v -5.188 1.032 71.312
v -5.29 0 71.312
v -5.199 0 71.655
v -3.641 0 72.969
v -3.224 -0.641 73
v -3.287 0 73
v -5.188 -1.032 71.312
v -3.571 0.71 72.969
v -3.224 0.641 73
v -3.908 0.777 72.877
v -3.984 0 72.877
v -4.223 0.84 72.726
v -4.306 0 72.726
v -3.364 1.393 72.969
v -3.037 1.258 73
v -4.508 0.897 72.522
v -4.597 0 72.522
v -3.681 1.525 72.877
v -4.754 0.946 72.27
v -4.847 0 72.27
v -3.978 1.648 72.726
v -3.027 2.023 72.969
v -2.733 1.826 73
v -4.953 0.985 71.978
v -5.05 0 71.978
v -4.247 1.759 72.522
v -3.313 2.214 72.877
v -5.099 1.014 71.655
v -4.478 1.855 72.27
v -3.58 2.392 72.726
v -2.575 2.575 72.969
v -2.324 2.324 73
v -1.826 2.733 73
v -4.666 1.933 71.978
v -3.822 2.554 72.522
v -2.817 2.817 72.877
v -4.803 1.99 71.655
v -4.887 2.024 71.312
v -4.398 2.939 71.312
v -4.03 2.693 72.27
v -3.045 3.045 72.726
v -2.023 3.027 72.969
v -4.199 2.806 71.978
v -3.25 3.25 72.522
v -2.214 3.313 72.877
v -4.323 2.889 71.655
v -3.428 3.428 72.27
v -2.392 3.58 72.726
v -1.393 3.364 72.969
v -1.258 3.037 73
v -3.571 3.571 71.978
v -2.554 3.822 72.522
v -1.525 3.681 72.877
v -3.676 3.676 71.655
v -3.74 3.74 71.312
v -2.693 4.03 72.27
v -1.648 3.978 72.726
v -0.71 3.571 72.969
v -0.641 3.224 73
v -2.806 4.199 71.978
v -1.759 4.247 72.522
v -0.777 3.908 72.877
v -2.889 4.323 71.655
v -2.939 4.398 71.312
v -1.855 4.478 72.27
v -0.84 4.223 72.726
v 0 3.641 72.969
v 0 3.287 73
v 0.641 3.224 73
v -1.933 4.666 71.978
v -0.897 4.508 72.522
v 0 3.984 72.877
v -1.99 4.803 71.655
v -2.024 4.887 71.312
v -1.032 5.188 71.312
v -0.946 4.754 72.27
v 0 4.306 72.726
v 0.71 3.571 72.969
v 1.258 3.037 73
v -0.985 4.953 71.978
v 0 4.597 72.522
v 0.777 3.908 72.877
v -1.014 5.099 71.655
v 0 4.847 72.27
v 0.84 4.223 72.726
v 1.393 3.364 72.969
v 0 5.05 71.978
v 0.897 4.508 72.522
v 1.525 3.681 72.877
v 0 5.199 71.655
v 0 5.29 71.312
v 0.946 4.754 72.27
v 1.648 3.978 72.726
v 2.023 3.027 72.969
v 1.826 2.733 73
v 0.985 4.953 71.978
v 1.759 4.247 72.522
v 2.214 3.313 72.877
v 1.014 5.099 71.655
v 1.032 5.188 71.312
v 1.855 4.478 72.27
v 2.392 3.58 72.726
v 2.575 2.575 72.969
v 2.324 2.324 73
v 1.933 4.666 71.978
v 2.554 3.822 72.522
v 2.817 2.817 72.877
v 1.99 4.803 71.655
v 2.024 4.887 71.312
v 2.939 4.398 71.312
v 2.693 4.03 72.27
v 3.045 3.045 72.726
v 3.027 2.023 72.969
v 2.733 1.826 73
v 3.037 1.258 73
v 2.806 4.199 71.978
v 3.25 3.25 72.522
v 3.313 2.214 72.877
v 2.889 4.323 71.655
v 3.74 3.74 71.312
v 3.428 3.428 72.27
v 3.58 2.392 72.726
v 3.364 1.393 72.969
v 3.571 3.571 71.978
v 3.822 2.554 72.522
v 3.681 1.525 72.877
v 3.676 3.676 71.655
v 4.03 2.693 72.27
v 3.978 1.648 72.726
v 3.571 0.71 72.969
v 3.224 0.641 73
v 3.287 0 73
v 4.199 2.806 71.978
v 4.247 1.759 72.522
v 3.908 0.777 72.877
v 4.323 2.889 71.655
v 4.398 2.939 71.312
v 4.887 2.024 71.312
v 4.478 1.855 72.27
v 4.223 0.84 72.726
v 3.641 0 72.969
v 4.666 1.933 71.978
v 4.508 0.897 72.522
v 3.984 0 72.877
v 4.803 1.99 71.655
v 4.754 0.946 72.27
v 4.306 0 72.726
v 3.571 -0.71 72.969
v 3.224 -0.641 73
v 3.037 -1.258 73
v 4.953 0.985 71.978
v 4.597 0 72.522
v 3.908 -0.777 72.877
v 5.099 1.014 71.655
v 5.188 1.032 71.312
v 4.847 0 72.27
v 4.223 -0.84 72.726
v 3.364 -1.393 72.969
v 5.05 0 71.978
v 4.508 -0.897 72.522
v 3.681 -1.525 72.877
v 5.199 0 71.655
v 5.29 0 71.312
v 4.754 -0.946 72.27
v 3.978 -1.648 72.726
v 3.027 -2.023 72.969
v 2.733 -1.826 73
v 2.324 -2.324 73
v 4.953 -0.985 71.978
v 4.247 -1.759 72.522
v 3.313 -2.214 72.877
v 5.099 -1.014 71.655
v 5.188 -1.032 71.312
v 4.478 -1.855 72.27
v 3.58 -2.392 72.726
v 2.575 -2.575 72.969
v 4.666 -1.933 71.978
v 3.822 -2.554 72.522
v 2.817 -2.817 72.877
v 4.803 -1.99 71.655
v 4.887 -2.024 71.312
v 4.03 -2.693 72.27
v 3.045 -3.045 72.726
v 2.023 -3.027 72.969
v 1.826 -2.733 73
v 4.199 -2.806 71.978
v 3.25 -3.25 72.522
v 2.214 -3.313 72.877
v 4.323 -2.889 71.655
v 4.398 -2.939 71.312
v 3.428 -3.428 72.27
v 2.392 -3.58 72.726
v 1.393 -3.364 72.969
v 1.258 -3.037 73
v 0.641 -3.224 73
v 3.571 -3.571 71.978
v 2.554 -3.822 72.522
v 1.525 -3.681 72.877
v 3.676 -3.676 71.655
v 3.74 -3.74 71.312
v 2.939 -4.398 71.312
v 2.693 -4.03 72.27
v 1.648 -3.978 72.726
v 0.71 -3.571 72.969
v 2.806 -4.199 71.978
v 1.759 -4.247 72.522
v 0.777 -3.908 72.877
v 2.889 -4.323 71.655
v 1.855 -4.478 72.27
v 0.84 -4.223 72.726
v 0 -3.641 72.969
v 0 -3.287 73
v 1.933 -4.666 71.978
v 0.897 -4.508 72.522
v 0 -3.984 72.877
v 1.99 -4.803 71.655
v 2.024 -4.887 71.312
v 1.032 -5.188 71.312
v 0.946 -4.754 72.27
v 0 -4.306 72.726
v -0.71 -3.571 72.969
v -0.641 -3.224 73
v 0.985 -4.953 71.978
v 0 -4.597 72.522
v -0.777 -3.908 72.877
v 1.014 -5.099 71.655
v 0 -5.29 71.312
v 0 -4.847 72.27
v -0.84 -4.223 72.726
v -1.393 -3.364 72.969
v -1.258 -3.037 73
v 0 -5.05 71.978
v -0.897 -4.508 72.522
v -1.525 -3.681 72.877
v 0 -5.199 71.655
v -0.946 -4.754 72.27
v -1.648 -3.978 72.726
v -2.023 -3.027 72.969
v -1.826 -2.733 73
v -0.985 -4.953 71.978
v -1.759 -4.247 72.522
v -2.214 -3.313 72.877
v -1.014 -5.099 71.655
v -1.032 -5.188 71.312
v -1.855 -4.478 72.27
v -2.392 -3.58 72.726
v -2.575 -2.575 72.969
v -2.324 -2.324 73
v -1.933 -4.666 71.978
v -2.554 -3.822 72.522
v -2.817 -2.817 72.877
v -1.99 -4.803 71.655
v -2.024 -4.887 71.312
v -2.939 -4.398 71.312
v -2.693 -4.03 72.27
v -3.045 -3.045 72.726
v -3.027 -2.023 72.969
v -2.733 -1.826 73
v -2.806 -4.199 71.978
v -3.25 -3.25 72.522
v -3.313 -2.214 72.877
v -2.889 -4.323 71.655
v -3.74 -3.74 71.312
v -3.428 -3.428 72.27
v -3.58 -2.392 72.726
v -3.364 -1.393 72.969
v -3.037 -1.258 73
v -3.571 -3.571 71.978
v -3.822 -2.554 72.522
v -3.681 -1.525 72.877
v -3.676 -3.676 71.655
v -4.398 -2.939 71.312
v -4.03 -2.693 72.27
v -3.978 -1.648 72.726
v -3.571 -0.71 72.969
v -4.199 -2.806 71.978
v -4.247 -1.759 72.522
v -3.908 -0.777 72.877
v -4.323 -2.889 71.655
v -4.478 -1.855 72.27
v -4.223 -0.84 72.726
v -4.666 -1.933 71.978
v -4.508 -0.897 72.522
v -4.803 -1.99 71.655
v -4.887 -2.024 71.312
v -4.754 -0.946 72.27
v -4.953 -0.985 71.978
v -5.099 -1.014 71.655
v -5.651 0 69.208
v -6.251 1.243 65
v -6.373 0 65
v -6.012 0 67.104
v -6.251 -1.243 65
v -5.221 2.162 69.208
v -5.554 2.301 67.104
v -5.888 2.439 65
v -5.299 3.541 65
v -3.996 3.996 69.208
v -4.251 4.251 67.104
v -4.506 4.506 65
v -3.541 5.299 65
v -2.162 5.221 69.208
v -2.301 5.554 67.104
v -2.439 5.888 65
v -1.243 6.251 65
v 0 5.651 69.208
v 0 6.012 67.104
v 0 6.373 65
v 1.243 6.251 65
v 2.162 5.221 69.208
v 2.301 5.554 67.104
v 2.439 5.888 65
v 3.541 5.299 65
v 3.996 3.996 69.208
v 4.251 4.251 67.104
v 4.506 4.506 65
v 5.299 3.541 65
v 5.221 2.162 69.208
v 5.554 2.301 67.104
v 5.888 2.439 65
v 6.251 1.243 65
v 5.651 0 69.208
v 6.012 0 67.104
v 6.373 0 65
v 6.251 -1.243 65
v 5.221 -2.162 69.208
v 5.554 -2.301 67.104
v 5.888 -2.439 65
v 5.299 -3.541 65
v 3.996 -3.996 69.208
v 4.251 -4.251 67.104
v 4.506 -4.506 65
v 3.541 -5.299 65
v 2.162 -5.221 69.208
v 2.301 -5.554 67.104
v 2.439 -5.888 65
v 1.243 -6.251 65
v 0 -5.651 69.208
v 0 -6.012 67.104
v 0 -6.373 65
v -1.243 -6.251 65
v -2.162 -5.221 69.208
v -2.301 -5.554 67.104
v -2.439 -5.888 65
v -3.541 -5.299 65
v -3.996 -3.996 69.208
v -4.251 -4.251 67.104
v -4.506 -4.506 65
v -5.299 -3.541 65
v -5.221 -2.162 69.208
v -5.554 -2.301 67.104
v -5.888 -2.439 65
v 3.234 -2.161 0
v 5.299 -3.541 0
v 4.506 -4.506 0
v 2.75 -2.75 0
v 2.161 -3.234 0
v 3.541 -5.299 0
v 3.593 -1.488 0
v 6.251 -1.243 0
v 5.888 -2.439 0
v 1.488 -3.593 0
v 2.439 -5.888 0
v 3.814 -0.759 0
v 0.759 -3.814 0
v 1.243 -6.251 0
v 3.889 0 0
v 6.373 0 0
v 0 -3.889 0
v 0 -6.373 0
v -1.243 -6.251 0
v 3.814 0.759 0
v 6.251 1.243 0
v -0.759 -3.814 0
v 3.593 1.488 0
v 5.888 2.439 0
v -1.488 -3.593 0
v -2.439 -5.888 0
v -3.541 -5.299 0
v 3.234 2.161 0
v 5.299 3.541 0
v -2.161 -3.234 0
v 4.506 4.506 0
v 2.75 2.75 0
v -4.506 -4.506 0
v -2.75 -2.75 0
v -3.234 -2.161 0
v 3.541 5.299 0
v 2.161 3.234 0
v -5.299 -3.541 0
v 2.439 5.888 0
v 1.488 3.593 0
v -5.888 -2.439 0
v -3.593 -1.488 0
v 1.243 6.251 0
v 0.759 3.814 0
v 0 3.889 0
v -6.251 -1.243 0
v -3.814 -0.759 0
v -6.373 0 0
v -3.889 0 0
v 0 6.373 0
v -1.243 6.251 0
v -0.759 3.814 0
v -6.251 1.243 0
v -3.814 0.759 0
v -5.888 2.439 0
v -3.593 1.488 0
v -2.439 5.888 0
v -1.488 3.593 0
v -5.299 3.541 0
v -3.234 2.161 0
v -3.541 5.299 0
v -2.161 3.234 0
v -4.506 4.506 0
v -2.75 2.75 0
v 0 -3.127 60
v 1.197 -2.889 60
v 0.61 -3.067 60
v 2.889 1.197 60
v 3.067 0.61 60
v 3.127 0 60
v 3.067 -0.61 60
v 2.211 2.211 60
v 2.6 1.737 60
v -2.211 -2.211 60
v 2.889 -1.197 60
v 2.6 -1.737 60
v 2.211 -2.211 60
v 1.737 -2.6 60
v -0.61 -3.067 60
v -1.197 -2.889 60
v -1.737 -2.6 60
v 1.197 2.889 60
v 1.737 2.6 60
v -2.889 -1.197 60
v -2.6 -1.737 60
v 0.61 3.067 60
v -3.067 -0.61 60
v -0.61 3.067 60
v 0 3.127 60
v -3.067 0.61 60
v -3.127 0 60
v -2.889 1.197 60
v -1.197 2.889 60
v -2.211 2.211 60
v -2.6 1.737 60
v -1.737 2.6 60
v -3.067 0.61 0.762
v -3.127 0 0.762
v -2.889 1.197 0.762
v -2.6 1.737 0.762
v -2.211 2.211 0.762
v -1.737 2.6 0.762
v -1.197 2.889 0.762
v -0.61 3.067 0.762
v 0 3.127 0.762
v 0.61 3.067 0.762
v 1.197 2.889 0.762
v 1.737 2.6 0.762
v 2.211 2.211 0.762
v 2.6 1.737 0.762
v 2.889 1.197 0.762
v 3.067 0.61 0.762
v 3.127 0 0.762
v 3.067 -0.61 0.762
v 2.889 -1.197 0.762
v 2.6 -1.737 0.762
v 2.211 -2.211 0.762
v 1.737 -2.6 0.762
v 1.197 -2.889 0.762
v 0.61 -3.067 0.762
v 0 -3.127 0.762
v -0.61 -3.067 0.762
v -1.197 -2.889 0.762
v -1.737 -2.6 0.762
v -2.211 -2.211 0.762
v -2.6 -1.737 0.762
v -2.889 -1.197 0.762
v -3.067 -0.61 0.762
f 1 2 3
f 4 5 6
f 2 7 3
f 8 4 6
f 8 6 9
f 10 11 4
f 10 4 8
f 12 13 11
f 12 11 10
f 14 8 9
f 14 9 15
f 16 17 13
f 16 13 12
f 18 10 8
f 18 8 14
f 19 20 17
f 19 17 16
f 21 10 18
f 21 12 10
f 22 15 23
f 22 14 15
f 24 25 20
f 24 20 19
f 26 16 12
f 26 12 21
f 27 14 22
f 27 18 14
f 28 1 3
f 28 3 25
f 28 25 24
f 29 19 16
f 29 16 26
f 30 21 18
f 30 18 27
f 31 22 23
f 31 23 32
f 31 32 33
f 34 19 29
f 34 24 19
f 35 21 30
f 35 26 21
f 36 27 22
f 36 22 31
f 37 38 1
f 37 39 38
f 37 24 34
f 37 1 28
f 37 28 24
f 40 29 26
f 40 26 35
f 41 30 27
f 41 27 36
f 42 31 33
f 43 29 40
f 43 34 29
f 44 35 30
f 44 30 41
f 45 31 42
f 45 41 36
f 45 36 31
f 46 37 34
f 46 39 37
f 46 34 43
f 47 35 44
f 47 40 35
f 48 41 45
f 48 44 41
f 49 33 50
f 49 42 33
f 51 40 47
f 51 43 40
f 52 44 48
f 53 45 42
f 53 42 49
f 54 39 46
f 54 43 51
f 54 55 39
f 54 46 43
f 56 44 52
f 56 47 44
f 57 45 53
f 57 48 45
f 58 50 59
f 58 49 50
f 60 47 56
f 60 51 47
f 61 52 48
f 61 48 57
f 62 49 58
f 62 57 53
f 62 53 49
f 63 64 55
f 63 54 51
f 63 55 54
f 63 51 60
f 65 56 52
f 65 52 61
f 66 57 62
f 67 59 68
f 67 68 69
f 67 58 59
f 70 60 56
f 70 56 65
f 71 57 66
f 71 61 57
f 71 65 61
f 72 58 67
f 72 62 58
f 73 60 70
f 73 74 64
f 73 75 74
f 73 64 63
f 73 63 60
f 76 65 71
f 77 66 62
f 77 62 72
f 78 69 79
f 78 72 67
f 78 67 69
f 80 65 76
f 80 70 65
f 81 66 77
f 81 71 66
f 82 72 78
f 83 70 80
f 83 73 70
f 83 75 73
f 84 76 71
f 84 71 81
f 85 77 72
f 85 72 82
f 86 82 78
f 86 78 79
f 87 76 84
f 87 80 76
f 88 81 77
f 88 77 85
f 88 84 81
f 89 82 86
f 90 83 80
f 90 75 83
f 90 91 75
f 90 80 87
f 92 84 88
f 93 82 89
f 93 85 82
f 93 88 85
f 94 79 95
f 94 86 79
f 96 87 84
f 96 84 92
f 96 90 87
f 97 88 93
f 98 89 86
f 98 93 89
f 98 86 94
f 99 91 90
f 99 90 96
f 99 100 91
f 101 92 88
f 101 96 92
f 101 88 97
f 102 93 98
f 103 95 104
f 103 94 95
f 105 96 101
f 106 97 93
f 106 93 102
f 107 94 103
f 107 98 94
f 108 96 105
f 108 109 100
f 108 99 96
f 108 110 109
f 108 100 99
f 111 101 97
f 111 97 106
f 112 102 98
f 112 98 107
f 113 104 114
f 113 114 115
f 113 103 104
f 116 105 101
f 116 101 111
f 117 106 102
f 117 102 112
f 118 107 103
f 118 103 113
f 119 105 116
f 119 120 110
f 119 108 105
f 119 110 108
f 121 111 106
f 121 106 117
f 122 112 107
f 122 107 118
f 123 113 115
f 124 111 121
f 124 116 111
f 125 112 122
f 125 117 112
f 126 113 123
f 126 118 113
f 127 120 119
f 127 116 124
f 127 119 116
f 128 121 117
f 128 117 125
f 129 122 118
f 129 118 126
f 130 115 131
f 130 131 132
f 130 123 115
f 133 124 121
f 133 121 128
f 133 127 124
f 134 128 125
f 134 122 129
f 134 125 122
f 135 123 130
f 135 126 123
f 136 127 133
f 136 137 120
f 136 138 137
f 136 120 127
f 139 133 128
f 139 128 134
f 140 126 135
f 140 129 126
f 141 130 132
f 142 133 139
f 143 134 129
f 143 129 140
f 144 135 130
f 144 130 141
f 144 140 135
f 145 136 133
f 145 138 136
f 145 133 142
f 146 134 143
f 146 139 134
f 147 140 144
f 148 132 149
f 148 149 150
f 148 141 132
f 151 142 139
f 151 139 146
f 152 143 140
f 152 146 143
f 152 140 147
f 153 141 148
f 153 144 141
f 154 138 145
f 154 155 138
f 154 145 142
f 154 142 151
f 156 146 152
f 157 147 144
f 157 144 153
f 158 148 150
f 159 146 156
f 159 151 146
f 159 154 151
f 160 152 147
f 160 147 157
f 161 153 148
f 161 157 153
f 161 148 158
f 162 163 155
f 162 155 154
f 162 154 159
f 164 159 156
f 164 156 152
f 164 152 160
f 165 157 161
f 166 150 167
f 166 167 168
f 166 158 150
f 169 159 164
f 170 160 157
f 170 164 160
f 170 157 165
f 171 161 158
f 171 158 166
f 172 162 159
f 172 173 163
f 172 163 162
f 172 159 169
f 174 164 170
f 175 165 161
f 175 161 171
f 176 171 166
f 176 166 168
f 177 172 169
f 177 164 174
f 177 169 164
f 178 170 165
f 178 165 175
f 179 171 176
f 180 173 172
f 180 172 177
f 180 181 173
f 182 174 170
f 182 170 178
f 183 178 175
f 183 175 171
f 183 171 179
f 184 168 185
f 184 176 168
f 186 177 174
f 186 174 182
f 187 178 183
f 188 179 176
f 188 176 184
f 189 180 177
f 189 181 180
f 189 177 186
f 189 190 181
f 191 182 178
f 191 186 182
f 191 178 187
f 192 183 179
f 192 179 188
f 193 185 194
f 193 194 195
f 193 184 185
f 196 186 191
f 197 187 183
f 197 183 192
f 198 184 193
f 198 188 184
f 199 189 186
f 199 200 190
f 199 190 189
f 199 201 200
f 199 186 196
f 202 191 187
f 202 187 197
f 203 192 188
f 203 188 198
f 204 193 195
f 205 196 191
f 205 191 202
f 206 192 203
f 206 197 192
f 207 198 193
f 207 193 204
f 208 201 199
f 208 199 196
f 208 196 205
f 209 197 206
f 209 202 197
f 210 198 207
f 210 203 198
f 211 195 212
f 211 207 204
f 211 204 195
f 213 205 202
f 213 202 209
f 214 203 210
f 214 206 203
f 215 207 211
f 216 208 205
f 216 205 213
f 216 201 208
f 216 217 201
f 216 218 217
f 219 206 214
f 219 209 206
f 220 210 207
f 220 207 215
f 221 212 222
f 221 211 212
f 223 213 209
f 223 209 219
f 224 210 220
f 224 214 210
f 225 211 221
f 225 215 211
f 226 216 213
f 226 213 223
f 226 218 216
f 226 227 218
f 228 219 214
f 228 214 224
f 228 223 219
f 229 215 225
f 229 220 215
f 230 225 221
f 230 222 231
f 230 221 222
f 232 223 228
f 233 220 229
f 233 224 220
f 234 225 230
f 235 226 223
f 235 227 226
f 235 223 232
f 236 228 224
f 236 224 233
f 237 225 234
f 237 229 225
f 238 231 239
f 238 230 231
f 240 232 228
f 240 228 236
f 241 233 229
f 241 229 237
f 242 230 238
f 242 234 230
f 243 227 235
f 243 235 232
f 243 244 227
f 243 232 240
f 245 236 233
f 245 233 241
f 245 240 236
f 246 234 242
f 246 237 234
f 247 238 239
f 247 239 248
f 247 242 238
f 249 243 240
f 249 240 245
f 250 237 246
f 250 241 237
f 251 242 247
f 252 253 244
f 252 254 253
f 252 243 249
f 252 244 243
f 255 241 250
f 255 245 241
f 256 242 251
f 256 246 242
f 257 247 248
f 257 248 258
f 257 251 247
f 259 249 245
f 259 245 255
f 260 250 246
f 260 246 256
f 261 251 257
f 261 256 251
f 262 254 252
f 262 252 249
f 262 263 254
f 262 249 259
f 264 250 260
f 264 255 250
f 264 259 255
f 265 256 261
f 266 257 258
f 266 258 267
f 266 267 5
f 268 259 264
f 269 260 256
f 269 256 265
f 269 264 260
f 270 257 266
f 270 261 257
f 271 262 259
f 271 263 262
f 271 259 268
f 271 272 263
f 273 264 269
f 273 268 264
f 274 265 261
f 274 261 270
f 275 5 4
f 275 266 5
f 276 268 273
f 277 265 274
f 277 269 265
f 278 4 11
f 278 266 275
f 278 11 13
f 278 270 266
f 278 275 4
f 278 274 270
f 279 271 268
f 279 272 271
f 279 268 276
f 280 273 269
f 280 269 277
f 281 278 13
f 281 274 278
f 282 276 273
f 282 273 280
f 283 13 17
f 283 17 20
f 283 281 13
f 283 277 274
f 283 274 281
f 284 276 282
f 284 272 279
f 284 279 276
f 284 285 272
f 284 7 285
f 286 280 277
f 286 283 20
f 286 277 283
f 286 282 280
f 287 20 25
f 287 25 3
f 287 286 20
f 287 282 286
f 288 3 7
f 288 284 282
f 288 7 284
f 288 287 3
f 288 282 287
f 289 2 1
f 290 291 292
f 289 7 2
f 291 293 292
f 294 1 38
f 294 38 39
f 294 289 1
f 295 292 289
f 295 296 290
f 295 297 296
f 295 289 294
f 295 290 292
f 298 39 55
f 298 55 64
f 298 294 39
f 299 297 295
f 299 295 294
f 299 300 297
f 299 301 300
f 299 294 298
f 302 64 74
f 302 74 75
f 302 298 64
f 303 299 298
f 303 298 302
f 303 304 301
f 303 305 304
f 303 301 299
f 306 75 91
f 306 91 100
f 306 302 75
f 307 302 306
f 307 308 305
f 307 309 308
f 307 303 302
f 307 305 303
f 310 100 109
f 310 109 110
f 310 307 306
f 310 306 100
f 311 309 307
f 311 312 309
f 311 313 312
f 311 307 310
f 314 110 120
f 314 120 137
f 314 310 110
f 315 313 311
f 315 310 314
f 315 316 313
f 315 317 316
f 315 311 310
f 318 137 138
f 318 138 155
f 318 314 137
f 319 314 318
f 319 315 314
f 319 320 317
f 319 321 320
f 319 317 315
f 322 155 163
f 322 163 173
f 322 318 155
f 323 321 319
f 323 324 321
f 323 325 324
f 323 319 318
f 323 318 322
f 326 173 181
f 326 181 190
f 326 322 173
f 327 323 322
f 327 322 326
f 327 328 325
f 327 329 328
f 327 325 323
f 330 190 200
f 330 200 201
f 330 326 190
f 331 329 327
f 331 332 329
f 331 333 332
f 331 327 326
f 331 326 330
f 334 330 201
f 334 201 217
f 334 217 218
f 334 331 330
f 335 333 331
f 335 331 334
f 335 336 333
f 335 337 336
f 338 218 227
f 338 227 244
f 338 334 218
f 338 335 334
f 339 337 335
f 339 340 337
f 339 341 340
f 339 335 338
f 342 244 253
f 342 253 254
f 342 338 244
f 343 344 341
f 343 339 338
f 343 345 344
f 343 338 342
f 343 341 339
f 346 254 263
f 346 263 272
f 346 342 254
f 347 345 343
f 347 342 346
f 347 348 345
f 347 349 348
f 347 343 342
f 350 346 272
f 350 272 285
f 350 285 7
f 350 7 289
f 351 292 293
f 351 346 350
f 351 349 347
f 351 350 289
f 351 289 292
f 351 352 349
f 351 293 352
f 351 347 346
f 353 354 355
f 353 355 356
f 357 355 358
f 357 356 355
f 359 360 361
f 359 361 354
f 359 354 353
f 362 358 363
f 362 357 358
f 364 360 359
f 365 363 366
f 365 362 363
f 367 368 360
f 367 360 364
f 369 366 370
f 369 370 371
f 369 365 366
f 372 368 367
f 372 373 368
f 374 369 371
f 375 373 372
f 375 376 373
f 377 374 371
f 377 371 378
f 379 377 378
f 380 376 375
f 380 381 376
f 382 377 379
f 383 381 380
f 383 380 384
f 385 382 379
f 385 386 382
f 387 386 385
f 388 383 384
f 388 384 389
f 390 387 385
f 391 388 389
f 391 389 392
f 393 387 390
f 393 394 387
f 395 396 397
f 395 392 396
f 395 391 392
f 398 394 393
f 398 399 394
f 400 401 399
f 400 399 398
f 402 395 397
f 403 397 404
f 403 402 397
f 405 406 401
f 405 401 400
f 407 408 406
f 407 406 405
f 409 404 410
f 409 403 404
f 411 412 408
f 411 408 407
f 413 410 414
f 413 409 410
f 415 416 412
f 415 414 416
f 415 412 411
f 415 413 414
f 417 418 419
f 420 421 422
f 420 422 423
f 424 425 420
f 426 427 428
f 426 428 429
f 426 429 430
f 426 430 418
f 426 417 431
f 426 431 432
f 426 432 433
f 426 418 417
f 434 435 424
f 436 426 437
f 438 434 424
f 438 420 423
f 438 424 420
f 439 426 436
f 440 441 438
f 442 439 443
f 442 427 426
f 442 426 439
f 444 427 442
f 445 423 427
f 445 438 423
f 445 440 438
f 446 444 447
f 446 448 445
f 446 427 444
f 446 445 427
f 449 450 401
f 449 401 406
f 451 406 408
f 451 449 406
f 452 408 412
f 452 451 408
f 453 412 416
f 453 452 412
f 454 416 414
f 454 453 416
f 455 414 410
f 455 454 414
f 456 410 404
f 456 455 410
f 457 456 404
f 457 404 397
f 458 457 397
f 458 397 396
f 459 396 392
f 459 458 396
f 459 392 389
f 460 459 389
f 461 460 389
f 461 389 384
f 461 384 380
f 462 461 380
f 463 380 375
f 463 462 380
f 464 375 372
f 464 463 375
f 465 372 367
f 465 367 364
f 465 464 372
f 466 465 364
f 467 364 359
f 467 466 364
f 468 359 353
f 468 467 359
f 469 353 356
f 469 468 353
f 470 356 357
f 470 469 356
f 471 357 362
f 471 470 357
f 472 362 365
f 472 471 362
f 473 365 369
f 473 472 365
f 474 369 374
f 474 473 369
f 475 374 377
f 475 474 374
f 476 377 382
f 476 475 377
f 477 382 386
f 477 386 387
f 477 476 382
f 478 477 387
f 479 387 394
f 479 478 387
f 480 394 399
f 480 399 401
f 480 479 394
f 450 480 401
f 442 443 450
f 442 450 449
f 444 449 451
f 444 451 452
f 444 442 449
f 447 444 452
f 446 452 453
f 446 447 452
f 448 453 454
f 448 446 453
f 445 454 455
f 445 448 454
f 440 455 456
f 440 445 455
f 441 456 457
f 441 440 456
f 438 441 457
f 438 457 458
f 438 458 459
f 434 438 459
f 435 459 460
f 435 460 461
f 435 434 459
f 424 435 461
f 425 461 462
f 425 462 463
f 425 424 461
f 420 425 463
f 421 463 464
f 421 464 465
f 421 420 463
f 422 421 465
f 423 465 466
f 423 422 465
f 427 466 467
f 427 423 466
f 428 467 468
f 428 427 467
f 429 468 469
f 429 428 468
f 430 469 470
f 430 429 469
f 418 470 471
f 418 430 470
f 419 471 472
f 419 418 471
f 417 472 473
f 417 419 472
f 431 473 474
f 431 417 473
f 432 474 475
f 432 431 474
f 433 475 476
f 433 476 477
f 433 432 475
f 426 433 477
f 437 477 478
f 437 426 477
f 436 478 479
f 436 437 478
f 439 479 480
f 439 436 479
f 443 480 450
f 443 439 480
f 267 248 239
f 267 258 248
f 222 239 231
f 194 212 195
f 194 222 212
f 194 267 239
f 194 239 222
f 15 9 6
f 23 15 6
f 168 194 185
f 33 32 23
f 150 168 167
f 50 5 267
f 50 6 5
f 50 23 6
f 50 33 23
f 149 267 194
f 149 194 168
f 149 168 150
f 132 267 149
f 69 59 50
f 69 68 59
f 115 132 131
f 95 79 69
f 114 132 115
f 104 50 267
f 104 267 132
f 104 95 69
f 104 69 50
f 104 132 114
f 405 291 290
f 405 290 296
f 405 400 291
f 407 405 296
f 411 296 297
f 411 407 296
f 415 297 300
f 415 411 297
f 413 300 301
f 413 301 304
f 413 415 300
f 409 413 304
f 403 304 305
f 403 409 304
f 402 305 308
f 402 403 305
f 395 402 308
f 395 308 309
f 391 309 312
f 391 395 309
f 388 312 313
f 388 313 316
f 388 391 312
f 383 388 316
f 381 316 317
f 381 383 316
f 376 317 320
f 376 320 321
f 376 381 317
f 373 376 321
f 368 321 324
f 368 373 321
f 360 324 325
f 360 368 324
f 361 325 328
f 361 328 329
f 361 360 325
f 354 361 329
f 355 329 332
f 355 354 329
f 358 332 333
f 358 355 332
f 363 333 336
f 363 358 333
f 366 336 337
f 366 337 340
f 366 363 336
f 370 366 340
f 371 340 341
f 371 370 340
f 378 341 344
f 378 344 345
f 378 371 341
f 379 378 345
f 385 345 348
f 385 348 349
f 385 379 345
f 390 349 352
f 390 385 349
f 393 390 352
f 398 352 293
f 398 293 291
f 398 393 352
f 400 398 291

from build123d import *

# Parameters (mm, degrees)
F2_R    = 2.032
F3_SIZE = 0.762


with BuildPart() as f1:
    # F0 (on Front) → F1 (revolve)
    with BuildSketch(Plane.XZ):
        Polygon((-6.373, 65), (-6.373, 0), (-3.127, 0), (-3.127, 60), (0, 60), (0, 73), (-5, 73), align=None)
    revolve(axis=Axis((0, 0, 66.5), (0, 0, -1)))

    # F2
    f2_edges = [f1.edges().sort_by_distance(p)[0] for p in [
        (5, 0, 73),
    ]]
    fillet(f2_edges, radius=F2_R)

    # F3
    f3_edges = [f1.edges().sort_by_distance(p)[0] for p in [
        (3.127, 0, 0),
    ]]
    chamfer(f3_edges, length=F3_SIZE)


solid = f1.part
